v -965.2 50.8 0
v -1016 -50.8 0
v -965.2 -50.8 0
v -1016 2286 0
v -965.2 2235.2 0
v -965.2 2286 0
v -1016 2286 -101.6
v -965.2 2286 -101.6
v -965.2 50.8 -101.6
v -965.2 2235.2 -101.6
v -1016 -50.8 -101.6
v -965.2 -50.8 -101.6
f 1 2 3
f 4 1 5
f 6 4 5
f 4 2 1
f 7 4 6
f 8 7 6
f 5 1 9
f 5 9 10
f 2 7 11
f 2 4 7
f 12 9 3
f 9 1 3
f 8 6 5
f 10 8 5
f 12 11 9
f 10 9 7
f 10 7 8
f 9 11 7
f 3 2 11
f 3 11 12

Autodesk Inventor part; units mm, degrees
ref_plane "YZ Plane" through (0, 0, 0) normal (1, 0, 0) x (0, 1, 0)
ref_plane "XZ Plane" through (0, 0, 0) normal (0, 1, 0) x (-1, 0, 0)
ref_plane "XY Plane" through (0, 0, 0) normal (0, 0, 1) x (1, 0, 0)
ref_plane "Work Plane1" through (0, 0, 0) normal (0, 0, 1) x (1, 0, 0)
sketch "Sketch1" plane through (0, 0, 0) normal (0, 0, 1) x (1, 0, 0)
  line L0 (965.2, 2336.8) -> (-965.2, 2336.8) projected
  line L1 (-965.2, 2336.8) -> (-965.2, 2235.2) projected
  line L2 (-965.2, 2235.2) -> (965.2, 2235.2) projected
  line L3 (965.2, 2235.2) -> (965.2, 2336.8) projected
  line L4 (-1016, 2286) -> (-965.2, 2286) projected
  line L5 (965.2, 50.8) -> (-965.2, 50.8) projected
  line L6 (-965.2, 50.8) -> (-965.2, -50.8) projected
  line L7 (-965.2, -50.8) -> (965.2, -50.8) projected
  line L8 (965.2, -50.8) -> (965.2, 50.8) projected
  line L9 (-965.2, 2286) -> (-1016, 2286)
  line L10 (-1016, 2286) -> (-1016, -50.8)
  line L11 (-1016, -50.8) -> (-965.2, -50.8)
  line L12 (-965.2, -50.8) -> (-965.2, 2286)
  point P0 (0, 0)
  point P1 (-965.2, 2286)
extrude "Extrusion1" add sketch "Sketch1" against normal blind 101.6 contours L1 L12 L6 L11 L10 L4
properties part number "2X4X92" material "Wood (Birch)"
